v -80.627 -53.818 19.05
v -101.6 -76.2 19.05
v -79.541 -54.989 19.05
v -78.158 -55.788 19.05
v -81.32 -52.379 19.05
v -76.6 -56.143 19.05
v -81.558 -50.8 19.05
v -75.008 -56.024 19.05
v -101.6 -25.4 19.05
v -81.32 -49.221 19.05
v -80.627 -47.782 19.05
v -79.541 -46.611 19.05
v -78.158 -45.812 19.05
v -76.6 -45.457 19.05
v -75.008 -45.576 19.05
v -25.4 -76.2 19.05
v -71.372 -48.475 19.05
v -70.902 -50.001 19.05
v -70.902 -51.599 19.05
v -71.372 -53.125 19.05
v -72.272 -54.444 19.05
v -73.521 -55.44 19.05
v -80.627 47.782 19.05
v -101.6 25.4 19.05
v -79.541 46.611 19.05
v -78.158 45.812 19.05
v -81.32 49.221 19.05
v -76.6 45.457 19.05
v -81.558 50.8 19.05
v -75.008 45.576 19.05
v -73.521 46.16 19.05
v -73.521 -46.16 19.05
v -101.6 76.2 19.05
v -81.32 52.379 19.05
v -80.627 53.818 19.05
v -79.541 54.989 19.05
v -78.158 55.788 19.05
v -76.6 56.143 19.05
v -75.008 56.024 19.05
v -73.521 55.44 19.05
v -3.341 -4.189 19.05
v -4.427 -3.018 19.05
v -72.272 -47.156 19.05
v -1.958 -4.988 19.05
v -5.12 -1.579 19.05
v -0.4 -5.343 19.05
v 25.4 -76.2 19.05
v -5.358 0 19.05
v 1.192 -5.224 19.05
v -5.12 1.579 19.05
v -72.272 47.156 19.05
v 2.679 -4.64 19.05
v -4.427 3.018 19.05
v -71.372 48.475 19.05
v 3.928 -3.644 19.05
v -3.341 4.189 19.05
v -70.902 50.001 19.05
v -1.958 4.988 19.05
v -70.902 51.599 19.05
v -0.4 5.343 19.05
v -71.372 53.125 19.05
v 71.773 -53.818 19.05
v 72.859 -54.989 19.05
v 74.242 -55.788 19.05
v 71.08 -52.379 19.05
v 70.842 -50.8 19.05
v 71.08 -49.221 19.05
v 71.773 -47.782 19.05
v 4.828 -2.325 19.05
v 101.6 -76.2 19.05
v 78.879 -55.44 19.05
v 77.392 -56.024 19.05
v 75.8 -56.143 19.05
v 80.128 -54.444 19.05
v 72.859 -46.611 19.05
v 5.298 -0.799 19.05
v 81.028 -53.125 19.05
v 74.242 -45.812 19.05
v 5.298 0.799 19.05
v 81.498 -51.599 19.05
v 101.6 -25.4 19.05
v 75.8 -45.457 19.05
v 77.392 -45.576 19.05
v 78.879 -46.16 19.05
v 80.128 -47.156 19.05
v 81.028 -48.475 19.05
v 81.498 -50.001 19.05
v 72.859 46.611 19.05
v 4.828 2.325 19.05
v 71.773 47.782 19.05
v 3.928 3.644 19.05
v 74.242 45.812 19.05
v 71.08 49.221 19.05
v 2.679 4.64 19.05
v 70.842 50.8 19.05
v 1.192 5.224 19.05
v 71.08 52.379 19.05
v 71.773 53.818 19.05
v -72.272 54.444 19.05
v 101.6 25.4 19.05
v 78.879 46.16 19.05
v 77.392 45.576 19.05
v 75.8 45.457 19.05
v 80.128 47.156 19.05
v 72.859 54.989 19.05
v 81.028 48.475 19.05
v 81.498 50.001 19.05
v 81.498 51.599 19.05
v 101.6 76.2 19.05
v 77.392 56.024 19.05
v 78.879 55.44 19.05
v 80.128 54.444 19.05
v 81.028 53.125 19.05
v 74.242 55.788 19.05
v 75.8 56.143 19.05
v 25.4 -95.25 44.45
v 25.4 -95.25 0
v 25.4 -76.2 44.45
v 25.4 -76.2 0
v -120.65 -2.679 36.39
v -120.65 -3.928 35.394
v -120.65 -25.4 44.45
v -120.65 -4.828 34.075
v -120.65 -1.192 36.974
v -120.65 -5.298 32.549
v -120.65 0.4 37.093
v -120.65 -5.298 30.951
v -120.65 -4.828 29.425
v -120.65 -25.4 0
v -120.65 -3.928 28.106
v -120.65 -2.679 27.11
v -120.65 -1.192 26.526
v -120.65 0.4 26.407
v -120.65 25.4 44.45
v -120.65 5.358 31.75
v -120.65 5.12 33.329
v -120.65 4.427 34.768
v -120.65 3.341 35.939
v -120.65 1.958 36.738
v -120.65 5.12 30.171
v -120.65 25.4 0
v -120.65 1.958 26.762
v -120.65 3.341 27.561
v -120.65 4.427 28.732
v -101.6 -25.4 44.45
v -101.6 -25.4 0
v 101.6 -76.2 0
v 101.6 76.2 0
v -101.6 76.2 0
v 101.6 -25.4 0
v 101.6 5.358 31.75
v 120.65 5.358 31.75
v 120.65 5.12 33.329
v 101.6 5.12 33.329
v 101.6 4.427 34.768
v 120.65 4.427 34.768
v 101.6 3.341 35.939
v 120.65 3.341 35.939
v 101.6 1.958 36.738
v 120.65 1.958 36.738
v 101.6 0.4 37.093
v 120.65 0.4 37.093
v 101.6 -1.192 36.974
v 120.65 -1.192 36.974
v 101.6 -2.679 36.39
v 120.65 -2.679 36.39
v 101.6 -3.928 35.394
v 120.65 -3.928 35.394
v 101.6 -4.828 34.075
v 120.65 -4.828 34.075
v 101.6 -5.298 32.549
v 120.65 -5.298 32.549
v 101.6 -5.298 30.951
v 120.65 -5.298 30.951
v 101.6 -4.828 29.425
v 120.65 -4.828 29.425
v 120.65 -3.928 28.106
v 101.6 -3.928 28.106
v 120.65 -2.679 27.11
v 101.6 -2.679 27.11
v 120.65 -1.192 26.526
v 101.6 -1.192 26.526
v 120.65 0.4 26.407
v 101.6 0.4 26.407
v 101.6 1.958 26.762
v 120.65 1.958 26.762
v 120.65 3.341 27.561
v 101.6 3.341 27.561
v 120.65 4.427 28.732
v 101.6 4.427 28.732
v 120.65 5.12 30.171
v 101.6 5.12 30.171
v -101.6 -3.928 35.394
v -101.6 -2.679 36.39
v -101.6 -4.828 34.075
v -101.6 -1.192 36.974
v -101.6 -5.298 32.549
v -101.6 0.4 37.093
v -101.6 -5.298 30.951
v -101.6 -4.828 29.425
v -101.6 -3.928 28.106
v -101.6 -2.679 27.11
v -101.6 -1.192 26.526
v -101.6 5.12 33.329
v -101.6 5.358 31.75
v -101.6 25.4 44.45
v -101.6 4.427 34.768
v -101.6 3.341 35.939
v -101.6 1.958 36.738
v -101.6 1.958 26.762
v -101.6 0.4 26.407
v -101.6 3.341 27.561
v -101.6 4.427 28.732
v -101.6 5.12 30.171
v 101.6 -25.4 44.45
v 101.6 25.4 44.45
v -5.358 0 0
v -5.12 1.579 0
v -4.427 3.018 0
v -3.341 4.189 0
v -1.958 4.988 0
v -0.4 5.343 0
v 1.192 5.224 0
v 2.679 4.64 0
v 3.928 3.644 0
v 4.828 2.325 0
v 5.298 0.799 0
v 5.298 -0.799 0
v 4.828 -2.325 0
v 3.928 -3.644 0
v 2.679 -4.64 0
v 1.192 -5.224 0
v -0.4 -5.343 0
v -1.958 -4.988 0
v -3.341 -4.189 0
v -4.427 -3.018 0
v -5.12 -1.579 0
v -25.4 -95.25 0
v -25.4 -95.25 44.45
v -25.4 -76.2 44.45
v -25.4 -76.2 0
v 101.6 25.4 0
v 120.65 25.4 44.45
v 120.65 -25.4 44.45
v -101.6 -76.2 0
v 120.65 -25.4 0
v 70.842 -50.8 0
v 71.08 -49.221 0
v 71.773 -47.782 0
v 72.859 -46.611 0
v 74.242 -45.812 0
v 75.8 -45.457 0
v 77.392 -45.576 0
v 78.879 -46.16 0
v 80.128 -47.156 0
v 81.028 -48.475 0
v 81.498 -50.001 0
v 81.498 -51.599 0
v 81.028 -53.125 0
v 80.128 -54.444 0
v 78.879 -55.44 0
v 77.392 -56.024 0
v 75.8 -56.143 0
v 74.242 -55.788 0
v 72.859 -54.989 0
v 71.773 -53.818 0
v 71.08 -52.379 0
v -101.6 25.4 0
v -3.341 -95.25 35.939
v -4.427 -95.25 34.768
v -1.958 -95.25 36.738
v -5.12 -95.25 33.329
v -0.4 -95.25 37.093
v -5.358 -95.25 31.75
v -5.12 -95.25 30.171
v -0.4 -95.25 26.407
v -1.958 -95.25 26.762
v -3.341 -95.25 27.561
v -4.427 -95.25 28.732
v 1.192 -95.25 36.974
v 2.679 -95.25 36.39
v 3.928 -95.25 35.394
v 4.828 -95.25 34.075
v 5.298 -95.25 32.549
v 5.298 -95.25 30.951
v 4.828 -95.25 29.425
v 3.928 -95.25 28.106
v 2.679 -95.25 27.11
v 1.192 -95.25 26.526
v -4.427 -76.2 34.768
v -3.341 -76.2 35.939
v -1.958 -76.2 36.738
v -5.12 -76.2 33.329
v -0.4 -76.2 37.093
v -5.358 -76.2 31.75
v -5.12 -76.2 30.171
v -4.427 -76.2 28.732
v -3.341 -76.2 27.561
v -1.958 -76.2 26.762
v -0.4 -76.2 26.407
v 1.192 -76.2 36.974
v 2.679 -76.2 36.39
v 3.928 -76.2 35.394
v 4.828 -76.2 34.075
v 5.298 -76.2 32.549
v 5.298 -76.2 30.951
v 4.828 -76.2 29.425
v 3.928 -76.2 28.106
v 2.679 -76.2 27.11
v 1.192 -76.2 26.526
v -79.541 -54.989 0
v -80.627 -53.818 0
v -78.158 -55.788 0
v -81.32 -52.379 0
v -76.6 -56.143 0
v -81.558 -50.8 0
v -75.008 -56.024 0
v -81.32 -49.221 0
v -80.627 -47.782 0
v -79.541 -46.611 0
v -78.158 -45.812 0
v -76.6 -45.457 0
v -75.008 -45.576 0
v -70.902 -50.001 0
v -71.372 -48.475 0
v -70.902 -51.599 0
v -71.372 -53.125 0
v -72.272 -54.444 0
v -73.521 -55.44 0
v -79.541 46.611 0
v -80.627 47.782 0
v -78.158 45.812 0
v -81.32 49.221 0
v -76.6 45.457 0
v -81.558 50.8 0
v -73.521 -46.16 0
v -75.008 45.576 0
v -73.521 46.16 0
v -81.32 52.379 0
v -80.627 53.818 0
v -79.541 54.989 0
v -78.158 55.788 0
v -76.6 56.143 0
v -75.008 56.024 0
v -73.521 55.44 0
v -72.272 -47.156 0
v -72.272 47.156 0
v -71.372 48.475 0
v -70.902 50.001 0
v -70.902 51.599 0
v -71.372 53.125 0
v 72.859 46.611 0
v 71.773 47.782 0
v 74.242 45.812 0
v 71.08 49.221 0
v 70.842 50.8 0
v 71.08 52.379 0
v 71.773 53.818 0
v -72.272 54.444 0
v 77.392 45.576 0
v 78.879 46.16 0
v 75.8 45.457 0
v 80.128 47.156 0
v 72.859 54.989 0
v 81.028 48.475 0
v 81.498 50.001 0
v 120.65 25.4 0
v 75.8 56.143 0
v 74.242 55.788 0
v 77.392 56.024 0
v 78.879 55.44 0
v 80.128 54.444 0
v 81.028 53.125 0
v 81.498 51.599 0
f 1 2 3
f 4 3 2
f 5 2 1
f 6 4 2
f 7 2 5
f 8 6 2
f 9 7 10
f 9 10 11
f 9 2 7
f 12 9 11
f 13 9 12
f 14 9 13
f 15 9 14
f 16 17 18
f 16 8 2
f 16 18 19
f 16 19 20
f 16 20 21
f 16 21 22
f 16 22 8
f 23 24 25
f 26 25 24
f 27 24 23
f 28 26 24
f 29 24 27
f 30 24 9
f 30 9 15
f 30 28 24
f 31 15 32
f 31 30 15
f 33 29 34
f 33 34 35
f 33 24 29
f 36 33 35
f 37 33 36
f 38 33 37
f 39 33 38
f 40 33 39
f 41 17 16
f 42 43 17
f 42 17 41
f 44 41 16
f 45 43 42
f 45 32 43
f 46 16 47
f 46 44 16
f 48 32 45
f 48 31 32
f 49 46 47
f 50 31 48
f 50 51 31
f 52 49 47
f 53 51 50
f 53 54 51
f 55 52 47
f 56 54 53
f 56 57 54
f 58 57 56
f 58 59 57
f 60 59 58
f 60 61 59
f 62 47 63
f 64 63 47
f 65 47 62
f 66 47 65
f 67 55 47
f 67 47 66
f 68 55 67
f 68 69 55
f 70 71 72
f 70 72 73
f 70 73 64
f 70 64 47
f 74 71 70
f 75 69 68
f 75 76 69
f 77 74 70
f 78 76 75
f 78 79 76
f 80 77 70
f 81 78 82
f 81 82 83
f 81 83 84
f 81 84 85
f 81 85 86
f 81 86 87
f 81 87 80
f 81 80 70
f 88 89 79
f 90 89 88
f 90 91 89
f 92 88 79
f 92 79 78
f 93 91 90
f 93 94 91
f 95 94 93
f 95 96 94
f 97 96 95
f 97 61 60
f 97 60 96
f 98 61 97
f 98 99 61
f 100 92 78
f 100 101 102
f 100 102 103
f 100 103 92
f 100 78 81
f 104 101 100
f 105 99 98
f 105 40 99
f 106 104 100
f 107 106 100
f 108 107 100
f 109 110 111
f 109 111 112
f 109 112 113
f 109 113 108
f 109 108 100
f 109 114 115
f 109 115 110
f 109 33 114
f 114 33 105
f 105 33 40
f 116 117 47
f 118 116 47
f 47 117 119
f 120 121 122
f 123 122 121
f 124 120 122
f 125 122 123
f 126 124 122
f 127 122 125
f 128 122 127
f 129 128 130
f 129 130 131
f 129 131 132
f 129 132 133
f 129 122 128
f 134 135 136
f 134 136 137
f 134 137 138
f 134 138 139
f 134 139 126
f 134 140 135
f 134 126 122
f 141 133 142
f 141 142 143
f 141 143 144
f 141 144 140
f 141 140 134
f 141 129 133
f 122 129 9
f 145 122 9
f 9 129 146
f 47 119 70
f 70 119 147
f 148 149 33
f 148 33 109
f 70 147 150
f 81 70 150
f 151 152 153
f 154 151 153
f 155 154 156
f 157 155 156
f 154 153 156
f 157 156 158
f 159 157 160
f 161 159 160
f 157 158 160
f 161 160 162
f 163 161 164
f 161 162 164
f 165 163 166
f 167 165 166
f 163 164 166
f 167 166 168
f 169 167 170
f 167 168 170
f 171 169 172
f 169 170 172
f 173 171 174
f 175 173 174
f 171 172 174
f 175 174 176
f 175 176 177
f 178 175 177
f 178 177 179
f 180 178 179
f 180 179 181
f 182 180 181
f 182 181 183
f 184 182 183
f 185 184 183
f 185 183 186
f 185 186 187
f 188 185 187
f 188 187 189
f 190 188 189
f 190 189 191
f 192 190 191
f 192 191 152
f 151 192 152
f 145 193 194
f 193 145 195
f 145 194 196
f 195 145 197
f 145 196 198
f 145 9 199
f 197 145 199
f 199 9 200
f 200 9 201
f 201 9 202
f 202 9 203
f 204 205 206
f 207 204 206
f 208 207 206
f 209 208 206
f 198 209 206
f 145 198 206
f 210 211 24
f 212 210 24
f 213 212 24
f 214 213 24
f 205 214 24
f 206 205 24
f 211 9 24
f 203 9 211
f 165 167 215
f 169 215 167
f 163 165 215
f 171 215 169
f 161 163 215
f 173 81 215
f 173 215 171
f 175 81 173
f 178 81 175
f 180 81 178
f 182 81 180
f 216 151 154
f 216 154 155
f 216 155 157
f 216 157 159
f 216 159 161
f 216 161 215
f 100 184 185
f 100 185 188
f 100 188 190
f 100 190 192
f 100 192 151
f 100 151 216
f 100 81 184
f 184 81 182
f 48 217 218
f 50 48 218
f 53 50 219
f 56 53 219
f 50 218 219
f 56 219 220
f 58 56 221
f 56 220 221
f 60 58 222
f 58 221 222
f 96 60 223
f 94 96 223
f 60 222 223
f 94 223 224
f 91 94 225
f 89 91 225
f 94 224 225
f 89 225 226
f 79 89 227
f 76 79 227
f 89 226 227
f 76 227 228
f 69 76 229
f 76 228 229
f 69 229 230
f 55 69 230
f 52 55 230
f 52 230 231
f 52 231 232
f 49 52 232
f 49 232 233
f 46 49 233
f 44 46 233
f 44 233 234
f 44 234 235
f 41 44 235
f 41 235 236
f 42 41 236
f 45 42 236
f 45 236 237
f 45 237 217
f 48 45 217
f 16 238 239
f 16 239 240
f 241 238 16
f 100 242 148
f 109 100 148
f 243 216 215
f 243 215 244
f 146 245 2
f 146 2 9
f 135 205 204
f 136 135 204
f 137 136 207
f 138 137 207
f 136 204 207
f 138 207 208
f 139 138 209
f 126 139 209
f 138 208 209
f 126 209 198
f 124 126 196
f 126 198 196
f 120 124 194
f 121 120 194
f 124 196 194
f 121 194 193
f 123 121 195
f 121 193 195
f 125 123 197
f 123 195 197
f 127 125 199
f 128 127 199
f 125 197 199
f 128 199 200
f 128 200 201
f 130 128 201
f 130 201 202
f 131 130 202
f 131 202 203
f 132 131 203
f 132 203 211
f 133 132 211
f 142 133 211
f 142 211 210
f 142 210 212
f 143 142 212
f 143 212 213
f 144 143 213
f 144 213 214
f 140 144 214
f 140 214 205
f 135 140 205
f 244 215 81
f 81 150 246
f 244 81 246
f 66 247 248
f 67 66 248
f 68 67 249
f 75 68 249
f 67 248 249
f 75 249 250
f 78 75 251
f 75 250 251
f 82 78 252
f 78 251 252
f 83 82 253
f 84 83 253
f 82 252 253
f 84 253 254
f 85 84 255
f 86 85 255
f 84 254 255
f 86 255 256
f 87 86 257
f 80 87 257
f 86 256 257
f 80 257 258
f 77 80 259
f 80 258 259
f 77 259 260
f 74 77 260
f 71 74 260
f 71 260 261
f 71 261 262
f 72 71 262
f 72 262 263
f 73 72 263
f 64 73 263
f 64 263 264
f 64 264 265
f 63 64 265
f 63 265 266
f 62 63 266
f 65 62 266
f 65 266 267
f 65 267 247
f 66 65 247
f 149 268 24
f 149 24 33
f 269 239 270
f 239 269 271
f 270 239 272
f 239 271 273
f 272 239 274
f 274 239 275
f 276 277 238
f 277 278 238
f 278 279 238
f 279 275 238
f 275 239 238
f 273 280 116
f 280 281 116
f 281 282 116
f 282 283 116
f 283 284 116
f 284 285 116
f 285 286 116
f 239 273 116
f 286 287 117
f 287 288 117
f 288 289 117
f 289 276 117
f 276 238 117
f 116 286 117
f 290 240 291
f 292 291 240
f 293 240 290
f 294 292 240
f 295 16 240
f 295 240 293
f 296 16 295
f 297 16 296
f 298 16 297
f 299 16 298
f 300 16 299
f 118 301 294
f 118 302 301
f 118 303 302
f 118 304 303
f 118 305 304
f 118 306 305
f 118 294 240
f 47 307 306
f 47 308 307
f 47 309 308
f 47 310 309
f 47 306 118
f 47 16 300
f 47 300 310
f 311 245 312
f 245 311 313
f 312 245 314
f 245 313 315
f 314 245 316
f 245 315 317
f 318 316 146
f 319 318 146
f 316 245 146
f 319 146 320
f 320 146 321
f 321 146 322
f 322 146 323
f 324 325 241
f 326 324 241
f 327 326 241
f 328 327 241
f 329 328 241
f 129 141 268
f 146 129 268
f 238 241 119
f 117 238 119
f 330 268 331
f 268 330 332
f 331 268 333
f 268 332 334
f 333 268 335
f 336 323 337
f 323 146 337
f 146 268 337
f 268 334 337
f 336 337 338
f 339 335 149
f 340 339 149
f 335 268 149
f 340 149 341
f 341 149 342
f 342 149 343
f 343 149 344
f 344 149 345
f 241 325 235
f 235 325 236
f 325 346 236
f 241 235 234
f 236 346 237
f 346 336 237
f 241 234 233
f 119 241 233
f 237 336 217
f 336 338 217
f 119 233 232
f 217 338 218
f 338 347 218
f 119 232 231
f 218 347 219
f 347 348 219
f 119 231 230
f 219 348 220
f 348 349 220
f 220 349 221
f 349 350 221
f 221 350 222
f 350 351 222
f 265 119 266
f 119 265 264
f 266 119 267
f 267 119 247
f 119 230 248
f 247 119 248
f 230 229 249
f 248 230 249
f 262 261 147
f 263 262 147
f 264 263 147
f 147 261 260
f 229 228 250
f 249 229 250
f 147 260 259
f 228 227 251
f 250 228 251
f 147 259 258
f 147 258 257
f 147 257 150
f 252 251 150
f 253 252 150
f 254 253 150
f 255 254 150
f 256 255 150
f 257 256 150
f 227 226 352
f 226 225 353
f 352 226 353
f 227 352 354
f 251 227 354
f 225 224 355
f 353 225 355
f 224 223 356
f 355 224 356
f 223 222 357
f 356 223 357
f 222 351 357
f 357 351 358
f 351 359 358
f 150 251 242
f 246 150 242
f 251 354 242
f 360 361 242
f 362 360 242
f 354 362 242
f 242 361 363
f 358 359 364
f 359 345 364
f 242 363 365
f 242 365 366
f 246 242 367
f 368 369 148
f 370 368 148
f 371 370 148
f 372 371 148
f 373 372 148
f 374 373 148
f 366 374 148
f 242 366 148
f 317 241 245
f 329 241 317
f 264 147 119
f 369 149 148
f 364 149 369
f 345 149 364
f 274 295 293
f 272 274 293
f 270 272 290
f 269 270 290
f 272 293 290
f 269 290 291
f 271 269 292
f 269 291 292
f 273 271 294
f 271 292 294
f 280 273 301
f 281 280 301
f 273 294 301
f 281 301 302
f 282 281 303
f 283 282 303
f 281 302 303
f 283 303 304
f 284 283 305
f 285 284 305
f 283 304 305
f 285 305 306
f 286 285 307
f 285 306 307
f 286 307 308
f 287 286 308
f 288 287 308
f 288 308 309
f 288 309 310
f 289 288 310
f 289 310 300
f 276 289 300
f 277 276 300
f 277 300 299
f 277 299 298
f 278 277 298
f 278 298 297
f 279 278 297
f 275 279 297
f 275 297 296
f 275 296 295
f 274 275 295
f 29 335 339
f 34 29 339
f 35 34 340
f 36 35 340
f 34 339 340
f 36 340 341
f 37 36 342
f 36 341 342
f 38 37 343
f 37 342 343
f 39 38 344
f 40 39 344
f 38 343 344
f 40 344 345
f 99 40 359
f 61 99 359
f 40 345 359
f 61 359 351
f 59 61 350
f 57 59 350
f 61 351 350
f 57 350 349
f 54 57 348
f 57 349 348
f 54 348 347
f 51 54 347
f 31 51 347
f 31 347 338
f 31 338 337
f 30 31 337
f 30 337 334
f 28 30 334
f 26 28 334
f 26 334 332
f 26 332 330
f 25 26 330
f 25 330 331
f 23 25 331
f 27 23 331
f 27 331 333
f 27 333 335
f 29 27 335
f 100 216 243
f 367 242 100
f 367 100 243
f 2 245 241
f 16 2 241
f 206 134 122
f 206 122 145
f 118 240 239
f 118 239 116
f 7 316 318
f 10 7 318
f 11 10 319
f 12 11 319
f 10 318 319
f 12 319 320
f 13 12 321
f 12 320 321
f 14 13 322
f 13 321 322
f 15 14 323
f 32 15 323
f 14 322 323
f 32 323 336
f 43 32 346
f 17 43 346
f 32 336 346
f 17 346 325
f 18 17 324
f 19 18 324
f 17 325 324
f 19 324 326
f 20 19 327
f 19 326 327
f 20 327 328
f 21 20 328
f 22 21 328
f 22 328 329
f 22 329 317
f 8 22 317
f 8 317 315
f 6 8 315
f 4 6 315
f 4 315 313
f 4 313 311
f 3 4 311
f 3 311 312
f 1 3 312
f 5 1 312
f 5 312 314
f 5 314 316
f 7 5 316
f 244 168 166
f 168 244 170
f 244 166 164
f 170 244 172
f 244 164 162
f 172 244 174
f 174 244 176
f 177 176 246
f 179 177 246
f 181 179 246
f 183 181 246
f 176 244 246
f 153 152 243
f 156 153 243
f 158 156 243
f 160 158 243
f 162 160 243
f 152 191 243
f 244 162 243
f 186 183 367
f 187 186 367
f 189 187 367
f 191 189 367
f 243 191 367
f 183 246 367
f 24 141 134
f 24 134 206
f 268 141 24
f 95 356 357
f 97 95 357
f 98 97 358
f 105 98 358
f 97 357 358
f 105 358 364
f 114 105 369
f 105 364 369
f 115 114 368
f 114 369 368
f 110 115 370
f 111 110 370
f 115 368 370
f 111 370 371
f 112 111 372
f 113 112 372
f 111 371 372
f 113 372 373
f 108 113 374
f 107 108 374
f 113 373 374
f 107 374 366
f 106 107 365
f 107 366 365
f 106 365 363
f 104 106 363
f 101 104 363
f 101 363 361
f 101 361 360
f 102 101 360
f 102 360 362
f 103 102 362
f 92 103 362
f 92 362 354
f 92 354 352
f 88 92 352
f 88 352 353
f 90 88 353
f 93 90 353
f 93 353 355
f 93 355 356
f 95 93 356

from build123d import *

# Parameters (mm, degrees)
F0_W     = 203.2
F0_H     = 152.4
F1_DEPTH = 19.05
F3_D     = 10.71626
F4_W     = 19.05
F4_H     = 50.8
F4_W_2   = 50.8
F4_H_2   = 19.05
F5_DEPTH = 44.45
F7_D     = 10.71626
F9_D     = 10.71626


with BuildPart() as f1:
    # F0 (on Top) → F1 (new body)
    with BuildSketch(Plane.XY):
        Rectangle(F0_W, F0_H)
    extrude(amount=F1_DEPTH)

    # F3 (through all)
    with Locations(Plane.XY.offset(19.05)):
        with Locations((-76.2, 50.8), (76.2, 50.8), (0, 0), (-76.2, -50.8), (76.2, -50.8)):
            Hole(F3_D / 2)

    # F4 (on face) → F5 (join)
    with BuildSketch(Plane.XY):
        with Locations((-111.125, 0)):
            Rectangle(F4_W, F4_H)
        with Locations((0, -85.725)):
            Rectangle(F4_W_2, F4_H_2)
        with Locations((111.125, 0)):
            Rectangle(F4_W, F4_H)
    extrude(amount=F5_DEPTH)

    # F7 (through all)
    with Locations(Plane.XZ.offset(95.25)):
        with Locations((0, 31.75)):
            Hole(F7_D / 2)

    # F9 (through all)
    with Locations(Plane(origin=(-120.65, 0, 0), x_dir=(0, -1, 0), z_dir=(-1, 0, 0))):
        with Locations((0, 31.75)):
            Hole(F9_D / 2)


solid = f1.part
